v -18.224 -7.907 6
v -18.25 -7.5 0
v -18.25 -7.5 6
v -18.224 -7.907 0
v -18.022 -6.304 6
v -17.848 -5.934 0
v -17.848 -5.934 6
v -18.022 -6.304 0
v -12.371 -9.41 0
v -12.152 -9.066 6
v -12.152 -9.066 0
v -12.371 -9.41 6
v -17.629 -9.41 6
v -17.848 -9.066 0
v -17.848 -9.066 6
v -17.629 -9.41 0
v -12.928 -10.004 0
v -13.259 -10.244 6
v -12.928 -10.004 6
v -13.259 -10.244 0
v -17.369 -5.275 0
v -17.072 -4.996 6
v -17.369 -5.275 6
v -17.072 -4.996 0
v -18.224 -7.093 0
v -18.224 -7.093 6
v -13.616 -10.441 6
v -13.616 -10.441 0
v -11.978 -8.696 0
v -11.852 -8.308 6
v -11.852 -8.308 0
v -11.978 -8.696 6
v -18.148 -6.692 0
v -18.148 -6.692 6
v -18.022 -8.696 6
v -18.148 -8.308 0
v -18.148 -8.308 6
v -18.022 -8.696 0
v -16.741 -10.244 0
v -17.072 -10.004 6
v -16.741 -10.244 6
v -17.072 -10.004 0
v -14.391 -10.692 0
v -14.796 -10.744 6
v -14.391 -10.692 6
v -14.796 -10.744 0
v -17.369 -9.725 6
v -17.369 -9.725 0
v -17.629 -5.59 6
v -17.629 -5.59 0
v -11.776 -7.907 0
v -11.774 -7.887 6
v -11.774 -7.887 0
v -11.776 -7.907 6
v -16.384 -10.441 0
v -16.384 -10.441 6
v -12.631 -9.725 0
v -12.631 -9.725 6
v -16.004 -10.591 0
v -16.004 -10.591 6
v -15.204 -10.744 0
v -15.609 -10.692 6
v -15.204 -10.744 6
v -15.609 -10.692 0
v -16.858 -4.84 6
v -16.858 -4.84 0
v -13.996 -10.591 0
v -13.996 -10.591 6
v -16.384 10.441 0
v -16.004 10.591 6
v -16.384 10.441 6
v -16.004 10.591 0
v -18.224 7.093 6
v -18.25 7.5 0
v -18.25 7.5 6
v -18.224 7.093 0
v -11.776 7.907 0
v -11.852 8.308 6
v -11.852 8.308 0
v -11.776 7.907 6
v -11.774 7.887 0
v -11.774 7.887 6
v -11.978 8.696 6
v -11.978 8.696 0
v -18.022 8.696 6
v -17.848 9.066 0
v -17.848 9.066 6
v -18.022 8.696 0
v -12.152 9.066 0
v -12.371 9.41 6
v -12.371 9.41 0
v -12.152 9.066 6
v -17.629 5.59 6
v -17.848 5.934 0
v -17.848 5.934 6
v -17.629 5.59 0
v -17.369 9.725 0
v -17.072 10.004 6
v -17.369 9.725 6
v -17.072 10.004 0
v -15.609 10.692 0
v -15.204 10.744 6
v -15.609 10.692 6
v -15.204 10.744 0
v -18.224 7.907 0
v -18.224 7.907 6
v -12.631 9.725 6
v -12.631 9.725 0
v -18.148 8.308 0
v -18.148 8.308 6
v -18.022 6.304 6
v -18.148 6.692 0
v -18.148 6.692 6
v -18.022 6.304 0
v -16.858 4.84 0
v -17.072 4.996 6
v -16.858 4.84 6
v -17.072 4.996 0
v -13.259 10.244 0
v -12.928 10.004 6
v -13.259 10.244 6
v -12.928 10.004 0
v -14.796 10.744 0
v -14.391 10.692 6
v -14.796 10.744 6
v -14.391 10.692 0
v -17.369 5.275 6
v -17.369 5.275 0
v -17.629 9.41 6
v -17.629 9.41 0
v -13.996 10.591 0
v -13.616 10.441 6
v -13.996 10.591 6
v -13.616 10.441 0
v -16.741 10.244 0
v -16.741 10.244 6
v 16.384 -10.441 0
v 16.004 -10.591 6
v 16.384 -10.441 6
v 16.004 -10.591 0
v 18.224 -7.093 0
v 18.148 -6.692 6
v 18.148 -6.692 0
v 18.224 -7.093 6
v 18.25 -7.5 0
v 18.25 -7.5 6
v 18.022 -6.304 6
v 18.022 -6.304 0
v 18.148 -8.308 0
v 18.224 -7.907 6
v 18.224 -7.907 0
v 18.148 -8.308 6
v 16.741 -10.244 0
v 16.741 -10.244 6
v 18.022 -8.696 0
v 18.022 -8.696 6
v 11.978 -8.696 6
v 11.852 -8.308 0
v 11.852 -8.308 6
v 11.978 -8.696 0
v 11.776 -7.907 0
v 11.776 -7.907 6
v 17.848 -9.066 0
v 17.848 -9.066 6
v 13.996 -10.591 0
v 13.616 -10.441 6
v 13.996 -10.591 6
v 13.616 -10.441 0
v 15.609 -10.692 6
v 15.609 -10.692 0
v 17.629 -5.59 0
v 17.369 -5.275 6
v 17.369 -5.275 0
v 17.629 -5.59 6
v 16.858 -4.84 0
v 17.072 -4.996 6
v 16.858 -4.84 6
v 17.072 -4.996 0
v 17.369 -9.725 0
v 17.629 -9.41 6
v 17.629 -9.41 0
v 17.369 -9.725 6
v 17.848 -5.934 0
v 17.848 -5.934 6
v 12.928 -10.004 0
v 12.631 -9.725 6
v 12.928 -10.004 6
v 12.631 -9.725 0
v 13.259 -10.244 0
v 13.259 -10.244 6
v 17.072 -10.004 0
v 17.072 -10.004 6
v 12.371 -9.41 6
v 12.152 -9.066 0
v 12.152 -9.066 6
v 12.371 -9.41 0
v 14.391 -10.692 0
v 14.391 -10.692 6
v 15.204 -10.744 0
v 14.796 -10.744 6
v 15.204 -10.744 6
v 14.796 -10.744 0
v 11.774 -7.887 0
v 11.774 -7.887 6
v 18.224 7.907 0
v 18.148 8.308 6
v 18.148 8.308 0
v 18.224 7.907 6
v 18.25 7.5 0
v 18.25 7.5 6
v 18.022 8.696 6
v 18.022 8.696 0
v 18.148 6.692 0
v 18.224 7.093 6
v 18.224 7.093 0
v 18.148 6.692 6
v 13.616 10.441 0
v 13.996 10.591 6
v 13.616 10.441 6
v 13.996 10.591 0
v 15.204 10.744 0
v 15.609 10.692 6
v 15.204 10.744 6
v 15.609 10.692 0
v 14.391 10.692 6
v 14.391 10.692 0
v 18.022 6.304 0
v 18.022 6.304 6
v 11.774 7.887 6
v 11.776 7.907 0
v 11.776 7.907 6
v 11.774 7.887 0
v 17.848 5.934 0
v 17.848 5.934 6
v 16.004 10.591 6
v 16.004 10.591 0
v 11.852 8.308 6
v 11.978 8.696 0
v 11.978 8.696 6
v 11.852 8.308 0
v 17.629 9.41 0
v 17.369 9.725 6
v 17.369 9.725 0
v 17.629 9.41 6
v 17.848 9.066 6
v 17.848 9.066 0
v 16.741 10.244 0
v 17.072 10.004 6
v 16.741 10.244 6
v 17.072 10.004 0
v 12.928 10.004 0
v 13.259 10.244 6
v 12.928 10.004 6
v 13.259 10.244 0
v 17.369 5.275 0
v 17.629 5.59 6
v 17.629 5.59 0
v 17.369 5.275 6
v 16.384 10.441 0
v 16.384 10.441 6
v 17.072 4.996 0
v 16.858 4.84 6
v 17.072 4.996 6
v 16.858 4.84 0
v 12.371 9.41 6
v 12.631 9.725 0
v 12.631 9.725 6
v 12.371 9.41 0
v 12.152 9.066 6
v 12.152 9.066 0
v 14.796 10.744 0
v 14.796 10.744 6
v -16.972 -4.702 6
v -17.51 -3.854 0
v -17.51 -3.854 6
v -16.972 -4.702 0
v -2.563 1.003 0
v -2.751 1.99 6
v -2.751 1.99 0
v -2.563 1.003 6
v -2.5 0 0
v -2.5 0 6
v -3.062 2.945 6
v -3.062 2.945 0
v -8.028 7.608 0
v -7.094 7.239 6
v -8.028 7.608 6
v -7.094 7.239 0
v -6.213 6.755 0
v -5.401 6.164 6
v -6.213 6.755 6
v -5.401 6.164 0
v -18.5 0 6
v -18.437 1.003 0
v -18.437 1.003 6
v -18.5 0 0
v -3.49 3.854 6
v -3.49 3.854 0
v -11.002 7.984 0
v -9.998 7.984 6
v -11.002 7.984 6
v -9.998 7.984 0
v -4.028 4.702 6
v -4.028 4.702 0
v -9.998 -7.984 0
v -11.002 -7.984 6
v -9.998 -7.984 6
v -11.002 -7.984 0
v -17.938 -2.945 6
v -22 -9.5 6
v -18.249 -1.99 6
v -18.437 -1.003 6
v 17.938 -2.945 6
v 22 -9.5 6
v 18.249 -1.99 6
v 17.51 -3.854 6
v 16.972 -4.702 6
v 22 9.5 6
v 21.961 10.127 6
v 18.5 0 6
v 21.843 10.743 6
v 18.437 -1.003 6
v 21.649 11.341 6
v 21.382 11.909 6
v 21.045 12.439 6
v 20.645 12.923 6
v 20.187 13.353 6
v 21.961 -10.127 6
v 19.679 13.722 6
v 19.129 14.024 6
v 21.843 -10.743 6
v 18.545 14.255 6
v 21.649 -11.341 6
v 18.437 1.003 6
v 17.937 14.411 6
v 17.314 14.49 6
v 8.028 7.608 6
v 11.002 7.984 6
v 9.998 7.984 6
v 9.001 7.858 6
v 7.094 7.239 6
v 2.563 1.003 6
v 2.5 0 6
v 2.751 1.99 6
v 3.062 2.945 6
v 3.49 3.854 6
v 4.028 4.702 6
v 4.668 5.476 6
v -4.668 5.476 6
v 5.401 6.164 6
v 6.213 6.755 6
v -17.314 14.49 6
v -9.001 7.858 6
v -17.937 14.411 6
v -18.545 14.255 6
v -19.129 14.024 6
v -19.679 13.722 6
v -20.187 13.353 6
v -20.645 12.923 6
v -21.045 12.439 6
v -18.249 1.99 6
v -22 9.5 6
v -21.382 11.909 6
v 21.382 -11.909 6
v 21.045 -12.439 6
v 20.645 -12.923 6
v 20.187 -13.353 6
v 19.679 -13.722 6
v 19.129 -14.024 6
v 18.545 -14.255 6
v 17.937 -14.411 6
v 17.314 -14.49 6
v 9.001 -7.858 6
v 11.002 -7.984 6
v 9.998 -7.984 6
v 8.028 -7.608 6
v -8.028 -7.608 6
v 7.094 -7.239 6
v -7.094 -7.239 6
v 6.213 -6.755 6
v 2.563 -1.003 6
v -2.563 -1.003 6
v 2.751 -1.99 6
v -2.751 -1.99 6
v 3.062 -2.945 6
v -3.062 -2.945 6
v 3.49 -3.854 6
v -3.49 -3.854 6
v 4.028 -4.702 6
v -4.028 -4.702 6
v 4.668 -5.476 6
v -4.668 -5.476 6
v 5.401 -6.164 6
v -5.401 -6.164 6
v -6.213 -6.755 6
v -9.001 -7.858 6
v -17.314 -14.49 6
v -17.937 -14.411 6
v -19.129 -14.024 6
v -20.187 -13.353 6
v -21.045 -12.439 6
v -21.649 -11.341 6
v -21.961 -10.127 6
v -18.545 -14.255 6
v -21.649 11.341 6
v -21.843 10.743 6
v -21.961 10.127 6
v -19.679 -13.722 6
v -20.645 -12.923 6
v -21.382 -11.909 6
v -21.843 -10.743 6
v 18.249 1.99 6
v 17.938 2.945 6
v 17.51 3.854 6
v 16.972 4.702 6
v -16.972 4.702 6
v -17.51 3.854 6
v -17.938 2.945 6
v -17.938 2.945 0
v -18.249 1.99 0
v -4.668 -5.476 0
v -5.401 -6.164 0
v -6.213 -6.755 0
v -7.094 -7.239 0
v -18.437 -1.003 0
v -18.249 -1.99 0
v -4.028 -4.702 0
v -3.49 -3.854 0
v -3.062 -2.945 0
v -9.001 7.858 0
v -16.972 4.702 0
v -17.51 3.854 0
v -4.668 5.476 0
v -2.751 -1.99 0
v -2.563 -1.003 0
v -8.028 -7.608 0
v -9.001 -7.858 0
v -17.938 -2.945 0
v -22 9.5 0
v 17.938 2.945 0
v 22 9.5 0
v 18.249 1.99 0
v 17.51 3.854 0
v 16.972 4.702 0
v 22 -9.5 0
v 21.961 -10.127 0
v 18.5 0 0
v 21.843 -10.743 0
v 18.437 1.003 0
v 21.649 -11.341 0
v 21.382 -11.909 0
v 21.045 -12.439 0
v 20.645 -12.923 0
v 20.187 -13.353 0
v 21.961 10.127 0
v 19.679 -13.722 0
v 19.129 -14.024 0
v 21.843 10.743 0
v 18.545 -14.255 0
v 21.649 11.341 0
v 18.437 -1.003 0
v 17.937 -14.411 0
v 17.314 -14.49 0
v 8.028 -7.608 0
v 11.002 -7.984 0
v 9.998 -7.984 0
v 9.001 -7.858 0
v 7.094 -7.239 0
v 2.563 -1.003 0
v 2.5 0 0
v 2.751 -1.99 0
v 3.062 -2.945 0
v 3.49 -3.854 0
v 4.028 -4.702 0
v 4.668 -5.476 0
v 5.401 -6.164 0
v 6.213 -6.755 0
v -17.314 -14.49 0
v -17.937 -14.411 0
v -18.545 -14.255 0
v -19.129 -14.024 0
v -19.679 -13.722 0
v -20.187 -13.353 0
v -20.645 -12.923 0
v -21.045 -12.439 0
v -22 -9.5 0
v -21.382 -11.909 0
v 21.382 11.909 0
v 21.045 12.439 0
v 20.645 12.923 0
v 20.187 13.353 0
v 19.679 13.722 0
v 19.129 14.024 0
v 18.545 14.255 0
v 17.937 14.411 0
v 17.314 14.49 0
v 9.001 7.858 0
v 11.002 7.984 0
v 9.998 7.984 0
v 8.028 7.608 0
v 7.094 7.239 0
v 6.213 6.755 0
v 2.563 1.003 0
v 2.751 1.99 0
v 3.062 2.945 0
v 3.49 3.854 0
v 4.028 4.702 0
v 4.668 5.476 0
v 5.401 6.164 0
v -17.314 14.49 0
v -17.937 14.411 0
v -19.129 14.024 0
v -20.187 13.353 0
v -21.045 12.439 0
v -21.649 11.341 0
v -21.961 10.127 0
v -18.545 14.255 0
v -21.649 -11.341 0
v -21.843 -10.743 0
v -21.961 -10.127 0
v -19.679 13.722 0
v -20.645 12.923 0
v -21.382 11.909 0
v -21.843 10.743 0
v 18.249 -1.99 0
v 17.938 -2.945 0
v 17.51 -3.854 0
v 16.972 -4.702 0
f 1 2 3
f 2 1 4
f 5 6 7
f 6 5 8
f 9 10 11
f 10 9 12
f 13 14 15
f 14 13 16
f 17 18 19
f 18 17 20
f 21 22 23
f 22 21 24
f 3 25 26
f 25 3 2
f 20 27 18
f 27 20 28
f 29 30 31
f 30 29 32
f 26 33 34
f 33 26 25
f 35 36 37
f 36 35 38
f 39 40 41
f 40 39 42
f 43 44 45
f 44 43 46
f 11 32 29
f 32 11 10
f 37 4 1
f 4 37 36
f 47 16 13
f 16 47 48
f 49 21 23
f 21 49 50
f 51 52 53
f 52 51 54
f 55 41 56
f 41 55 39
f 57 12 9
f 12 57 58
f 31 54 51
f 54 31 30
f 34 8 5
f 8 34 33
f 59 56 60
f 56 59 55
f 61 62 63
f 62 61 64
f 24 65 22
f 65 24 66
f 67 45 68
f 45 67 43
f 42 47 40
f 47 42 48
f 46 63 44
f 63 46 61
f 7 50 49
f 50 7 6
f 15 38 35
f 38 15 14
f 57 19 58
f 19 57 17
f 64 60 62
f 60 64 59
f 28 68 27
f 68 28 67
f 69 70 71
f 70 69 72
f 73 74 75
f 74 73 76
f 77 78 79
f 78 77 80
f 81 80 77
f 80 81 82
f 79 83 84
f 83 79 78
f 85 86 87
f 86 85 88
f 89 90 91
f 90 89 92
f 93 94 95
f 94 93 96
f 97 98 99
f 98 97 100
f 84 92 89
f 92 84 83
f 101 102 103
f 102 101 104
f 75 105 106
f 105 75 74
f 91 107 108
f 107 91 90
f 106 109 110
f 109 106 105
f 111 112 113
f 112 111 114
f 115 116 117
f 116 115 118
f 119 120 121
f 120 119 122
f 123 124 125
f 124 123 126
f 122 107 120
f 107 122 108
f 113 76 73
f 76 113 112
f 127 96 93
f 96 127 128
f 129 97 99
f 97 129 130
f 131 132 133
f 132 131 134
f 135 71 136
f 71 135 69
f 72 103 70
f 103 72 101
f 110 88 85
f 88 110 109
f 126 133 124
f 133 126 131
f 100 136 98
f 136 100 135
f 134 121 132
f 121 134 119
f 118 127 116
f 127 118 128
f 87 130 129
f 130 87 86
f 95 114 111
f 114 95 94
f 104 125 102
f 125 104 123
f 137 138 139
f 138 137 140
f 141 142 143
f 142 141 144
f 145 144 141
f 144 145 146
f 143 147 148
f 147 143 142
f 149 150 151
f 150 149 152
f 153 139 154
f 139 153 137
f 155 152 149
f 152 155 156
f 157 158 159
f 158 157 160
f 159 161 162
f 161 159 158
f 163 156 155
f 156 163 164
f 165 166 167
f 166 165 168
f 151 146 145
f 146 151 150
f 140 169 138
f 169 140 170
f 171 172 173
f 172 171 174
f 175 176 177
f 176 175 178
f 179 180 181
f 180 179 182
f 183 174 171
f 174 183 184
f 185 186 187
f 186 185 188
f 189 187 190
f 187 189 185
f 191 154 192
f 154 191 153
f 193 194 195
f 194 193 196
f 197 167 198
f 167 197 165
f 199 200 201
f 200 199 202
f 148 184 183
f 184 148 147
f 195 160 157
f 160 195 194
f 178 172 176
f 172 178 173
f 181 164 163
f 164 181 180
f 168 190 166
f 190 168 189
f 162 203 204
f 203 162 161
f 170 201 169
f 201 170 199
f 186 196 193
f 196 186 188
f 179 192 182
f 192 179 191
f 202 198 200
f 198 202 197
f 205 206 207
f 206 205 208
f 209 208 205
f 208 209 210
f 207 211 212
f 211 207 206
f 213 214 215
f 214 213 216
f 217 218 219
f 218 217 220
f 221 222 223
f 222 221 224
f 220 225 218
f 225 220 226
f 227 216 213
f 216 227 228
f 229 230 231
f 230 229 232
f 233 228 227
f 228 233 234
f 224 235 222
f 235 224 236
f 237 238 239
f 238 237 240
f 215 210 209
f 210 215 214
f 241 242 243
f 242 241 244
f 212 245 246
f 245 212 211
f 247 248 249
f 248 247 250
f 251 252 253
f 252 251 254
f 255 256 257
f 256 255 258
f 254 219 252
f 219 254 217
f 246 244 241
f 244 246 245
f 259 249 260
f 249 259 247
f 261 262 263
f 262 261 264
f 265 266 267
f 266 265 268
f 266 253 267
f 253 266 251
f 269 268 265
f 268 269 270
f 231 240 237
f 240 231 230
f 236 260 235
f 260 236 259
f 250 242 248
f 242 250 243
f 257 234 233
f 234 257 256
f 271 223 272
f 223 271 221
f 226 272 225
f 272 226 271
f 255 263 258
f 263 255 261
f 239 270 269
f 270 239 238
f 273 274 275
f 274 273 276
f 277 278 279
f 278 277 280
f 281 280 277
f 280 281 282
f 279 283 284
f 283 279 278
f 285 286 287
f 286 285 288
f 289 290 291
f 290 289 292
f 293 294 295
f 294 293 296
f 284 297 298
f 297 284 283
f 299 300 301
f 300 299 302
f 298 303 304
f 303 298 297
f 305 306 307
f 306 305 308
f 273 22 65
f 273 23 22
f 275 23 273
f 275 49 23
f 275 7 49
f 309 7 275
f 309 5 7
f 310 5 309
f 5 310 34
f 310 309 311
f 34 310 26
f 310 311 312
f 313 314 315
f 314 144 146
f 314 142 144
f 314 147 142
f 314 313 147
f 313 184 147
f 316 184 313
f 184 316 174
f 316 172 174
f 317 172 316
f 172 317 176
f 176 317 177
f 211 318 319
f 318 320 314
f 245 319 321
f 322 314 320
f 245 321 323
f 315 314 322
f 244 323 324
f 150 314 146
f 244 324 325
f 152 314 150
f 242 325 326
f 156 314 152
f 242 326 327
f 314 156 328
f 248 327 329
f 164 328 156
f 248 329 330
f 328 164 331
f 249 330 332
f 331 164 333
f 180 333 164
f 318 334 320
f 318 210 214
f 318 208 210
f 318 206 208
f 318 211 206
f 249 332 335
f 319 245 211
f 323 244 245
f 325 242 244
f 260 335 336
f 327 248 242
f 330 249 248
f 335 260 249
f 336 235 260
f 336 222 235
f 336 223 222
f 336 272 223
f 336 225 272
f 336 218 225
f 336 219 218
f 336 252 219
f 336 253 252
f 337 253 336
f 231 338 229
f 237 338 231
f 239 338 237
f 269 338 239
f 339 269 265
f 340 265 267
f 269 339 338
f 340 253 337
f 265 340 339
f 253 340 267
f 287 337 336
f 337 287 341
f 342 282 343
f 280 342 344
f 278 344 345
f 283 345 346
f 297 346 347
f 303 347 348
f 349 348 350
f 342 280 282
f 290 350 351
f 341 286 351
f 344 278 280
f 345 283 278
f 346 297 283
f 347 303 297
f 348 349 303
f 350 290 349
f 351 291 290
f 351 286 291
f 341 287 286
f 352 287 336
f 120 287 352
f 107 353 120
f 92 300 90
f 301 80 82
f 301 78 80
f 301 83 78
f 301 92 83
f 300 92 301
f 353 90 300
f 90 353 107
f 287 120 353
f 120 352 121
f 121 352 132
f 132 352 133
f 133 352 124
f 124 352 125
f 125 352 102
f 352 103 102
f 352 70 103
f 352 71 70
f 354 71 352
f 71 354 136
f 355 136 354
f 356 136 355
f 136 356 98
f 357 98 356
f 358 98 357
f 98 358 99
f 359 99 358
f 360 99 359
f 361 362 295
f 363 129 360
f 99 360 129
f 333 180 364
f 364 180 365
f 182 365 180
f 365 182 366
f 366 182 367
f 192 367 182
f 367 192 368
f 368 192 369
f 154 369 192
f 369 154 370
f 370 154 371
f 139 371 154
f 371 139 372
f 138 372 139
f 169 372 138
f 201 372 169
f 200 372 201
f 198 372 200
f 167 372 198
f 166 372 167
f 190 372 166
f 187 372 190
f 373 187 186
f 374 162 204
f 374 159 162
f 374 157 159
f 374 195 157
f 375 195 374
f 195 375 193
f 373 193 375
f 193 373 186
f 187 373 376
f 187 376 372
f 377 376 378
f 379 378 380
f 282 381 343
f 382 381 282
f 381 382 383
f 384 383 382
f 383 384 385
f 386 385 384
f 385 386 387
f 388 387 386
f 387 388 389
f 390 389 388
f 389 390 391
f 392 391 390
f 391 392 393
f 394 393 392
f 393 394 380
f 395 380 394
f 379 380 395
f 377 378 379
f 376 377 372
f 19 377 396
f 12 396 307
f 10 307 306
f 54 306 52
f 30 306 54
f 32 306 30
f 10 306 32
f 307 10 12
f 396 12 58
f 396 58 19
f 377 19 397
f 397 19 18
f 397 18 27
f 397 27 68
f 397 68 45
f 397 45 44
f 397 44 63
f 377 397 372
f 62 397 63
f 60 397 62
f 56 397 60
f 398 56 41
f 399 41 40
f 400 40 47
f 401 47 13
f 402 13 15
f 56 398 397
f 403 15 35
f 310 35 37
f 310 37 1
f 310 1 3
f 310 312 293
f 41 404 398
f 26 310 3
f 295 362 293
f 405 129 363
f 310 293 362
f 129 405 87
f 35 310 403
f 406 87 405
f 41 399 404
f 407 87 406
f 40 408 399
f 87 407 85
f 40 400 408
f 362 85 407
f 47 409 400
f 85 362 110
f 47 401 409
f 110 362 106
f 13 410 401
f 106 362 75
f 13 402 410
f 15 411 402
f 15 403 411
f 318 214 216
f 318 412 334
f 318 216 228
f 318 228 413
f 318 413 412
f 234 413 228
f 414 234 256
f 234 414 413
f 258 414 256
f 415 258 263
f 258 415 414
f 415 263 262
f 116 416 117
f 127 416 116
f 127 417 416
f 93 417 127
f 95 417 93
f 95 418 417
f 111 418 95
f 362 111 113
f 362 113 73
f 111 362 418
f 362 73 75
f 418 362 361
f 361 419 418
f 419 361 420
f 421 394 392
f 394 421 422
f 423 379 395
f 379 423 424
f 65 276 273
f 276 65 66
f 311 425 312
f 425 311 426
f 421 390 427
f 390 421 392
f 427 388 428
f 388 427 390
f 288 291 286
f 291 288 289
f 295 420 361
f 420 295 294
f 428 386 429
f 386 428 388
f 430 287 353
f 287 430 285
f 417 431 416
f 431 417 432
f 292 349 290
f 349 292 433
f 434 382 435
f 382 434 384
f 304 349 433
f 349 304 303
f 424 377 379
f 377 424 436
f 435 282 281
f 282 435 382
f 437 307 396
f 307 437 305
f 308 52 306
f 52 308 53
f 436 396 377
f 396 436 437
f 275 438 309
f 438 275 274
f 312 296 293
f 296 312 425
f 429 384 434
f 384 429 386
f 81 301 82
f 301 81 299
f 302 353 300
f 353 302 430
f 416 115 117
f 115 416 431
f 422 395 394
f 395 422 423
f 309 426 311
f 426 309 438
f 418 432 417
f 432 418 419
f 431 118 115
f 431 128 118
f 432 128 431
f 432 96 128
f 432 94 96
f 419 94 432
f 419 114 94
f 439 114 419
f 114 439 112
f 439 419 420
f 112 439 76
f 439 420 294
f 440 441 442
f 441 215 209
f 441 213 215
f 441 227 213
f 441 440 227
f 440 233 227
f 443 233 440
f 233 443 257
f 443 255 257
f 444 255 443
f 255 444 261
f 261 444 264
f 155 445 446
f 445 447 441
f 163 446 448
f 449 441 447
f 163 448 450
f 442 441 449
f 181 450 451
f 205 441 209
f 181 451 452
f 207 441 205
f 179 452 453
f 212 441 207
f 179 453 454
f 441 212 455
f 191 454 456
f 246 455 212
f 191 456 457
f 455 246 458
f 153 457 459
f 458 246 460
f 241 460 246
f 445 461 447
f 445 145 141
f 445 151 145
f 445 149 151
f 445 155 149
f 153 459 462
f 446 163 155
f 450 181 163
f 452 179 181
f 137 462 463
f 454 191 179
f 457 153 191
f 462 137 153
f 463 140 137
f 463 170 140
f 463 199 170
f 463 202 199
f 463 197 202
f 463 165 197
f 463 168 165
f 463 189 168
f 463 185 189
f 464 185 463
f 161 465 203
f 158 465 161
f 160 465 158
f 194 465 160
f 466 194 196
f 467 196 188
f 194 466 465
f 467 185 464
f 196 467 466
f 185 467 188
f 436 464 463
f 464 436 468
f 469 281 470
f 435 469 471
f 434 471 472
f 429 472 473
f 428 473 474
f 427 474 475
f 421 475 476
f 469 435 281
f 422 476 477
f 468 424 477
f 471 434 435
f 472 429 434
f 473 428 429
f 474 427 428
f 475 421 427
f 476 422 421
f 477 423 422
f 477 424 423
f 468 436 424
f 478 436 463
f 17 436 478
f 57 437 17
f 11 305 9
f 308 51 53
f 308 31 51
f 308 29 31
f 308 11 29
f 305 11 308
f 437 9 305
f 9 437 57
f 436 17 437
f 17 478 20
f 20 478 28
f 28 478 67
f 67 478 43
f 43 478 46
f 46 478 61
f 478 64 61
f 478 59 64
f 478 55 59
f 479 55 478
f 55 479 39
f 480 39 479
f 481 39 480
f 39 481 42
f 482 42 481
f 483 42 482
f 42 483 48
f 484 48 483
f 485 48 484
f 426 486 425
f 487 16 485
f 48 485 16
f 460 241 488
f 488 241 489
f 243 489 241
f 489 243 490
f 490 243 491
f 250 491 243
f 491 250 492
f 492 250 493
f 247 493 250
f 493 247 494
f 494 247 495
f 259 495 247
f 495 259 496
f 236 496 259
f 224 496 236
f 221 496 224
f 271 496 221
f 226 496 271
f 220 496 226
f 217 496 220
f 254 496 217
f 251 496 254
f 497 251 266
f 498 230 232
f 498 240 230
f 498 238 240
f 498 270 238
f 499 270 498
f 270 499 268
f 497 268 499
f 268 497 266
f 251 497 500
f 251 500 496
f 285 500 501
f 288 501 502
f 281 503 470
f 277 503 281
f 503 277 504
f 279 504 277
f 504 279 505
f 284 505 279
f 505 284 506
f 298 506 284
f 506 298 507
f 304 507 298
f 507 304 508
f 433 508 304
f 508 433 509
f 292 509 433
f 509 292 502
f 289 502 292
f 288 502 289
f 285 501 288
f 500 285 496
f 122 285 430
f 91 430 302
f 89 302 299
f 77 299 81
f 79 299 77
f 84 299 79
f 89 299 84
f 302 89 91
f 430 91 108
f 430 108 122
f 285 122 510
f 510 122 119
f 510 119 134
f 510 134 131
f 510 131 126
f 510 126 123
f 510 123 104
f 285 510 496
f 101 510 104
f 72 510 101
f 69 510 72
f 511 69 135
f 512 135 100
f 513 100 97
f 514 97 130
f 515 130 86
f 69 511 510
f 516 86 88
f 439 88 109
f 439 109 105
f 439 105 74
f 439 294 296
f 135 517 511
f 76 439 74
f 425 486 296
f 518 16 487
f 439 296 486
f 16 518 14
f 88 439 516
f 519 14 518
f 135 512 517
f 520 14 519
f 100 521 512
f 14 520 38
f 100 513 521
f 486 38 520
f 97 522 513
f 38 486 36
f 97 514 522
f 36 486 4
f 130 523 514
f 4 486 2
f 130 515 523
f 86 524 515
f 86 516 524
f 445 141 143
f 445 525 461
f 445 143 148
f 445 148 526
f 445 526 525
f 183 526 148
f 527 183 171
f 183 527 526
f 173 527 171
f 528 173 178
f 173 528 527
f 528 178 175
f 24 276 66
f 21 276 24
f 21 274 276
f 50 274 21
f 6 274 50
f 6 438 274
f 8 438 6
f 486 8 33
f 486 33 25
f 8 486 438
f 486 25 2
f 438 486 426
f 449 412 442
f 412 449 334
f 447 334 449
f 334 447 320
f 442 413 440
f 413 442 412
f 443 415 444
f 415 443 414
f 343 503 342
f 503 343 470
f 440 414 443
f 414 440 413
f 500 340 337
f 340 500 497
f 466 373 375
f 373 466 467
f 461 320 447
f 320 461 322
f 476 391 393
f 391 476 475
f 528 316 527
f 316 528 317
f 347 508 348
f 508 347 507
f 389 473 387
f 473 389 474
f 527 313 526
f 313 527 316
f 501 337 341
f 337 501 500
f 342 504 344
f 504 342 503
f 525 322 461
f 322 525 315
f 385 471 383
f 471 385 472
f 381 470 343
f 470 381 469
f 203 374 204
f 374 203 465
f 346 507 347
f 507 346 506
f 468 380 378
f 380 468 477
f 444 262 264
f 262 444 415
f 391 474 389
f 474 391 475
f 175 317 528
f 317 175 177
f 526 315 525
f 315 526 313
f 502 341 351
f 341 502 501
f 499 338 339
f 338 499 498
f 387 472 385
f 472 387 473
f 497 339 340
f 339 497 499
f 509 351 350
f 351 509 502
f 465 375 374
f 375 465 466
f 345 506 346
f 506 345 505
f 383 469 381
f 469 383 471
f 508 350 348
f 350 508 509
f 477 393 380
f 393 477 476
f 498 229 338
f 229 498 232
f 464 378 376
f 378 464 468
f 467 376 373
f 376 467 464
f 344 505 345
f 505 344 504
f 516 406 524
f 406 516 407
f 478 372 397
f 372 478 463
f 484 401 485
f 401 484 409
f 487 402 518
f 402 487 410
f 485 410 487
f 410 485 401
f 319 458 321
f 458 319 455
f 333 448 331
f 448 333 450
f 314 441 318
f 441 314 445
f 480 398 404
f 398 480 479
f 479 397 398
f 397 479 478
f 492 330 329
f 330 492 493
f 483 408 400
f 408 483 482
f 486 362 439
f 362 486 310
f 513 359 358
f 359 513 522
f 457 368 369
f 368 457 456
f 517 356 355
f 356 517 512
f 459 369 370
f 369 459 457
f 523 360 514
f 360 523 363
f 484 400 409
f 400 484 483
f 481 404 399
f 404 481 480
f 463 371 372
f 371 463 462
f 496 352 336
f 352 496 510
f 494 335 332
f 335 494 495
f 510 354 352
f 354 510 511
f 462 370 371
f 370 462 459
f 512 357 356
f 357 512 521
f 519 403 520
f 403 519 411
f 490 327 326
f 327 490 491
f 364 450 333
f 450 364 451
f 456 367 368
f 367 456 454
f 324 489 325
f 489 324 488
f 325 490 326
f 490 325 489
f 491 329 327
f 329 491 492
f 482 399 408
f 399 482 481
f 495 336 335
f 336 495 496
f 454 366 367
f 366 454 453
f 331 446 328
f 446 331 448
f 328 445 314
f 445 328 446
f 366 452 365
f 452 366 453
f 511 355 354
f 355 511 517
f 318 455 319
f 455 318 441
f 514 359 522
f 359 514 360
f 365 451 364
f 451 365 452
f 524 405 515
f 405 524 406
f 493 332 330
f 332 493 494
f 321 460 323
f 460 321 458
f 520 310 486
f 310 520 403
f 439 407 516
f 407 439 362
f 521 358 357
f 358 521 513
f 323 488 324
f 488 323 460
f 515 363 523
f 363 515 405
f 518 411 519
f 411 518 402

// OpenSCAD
$fn = 50;


difference() {
	union() {
		hull() {
			translate(v = [-17.0000000000, 9.5000000000, 0]) {
				cylinder(h = 6, r = 5);
			}
			translate(v = [17.0000000000, 9.5000000000, 0]) {
				cylinder(h = 6, r = 5);
			}
			translate(v = [-17.0000000000, -9.5000000000, 0]) {
				cylinder(h = 6, r = 5);
			}
			translate(v = [17.0000000000, -9.5000000000, 0]) {
				cylinder(h = 6, r = 5);
			}
		}
	}
	union() {
		#translate(v = [-15.0000000000, -7.5000000000, -100.0000000000]) {
			cylinder(h = 200, r = 3.2500000000);
		}
		#translate(v = [-15.0000000000, 7.5000000000, -100.0000000000]) {
			cylinder(h = 200, r = 3.2500000000);
		}
		#translate(v = [15.0000000000, -7.5000000000, -100.0000000000]) {
			cylinder(h = 200, r = 3.2500000000);
		}
		#translate(v = [15.0000000000, 7.5000000000, -100.0000000000]) {
			cylinder(h = 200, r = 3.2500000000);
		}
		#translate(v = [-10.5000000000, 0, 0]) {
			cylinder(h = 6, r = 8.0000000000);
		}
		#translate(v = [10.5000000000, 0, 0]) {
			cylinder(h = 6, r = 8.0000000000);
		}
	}
}
